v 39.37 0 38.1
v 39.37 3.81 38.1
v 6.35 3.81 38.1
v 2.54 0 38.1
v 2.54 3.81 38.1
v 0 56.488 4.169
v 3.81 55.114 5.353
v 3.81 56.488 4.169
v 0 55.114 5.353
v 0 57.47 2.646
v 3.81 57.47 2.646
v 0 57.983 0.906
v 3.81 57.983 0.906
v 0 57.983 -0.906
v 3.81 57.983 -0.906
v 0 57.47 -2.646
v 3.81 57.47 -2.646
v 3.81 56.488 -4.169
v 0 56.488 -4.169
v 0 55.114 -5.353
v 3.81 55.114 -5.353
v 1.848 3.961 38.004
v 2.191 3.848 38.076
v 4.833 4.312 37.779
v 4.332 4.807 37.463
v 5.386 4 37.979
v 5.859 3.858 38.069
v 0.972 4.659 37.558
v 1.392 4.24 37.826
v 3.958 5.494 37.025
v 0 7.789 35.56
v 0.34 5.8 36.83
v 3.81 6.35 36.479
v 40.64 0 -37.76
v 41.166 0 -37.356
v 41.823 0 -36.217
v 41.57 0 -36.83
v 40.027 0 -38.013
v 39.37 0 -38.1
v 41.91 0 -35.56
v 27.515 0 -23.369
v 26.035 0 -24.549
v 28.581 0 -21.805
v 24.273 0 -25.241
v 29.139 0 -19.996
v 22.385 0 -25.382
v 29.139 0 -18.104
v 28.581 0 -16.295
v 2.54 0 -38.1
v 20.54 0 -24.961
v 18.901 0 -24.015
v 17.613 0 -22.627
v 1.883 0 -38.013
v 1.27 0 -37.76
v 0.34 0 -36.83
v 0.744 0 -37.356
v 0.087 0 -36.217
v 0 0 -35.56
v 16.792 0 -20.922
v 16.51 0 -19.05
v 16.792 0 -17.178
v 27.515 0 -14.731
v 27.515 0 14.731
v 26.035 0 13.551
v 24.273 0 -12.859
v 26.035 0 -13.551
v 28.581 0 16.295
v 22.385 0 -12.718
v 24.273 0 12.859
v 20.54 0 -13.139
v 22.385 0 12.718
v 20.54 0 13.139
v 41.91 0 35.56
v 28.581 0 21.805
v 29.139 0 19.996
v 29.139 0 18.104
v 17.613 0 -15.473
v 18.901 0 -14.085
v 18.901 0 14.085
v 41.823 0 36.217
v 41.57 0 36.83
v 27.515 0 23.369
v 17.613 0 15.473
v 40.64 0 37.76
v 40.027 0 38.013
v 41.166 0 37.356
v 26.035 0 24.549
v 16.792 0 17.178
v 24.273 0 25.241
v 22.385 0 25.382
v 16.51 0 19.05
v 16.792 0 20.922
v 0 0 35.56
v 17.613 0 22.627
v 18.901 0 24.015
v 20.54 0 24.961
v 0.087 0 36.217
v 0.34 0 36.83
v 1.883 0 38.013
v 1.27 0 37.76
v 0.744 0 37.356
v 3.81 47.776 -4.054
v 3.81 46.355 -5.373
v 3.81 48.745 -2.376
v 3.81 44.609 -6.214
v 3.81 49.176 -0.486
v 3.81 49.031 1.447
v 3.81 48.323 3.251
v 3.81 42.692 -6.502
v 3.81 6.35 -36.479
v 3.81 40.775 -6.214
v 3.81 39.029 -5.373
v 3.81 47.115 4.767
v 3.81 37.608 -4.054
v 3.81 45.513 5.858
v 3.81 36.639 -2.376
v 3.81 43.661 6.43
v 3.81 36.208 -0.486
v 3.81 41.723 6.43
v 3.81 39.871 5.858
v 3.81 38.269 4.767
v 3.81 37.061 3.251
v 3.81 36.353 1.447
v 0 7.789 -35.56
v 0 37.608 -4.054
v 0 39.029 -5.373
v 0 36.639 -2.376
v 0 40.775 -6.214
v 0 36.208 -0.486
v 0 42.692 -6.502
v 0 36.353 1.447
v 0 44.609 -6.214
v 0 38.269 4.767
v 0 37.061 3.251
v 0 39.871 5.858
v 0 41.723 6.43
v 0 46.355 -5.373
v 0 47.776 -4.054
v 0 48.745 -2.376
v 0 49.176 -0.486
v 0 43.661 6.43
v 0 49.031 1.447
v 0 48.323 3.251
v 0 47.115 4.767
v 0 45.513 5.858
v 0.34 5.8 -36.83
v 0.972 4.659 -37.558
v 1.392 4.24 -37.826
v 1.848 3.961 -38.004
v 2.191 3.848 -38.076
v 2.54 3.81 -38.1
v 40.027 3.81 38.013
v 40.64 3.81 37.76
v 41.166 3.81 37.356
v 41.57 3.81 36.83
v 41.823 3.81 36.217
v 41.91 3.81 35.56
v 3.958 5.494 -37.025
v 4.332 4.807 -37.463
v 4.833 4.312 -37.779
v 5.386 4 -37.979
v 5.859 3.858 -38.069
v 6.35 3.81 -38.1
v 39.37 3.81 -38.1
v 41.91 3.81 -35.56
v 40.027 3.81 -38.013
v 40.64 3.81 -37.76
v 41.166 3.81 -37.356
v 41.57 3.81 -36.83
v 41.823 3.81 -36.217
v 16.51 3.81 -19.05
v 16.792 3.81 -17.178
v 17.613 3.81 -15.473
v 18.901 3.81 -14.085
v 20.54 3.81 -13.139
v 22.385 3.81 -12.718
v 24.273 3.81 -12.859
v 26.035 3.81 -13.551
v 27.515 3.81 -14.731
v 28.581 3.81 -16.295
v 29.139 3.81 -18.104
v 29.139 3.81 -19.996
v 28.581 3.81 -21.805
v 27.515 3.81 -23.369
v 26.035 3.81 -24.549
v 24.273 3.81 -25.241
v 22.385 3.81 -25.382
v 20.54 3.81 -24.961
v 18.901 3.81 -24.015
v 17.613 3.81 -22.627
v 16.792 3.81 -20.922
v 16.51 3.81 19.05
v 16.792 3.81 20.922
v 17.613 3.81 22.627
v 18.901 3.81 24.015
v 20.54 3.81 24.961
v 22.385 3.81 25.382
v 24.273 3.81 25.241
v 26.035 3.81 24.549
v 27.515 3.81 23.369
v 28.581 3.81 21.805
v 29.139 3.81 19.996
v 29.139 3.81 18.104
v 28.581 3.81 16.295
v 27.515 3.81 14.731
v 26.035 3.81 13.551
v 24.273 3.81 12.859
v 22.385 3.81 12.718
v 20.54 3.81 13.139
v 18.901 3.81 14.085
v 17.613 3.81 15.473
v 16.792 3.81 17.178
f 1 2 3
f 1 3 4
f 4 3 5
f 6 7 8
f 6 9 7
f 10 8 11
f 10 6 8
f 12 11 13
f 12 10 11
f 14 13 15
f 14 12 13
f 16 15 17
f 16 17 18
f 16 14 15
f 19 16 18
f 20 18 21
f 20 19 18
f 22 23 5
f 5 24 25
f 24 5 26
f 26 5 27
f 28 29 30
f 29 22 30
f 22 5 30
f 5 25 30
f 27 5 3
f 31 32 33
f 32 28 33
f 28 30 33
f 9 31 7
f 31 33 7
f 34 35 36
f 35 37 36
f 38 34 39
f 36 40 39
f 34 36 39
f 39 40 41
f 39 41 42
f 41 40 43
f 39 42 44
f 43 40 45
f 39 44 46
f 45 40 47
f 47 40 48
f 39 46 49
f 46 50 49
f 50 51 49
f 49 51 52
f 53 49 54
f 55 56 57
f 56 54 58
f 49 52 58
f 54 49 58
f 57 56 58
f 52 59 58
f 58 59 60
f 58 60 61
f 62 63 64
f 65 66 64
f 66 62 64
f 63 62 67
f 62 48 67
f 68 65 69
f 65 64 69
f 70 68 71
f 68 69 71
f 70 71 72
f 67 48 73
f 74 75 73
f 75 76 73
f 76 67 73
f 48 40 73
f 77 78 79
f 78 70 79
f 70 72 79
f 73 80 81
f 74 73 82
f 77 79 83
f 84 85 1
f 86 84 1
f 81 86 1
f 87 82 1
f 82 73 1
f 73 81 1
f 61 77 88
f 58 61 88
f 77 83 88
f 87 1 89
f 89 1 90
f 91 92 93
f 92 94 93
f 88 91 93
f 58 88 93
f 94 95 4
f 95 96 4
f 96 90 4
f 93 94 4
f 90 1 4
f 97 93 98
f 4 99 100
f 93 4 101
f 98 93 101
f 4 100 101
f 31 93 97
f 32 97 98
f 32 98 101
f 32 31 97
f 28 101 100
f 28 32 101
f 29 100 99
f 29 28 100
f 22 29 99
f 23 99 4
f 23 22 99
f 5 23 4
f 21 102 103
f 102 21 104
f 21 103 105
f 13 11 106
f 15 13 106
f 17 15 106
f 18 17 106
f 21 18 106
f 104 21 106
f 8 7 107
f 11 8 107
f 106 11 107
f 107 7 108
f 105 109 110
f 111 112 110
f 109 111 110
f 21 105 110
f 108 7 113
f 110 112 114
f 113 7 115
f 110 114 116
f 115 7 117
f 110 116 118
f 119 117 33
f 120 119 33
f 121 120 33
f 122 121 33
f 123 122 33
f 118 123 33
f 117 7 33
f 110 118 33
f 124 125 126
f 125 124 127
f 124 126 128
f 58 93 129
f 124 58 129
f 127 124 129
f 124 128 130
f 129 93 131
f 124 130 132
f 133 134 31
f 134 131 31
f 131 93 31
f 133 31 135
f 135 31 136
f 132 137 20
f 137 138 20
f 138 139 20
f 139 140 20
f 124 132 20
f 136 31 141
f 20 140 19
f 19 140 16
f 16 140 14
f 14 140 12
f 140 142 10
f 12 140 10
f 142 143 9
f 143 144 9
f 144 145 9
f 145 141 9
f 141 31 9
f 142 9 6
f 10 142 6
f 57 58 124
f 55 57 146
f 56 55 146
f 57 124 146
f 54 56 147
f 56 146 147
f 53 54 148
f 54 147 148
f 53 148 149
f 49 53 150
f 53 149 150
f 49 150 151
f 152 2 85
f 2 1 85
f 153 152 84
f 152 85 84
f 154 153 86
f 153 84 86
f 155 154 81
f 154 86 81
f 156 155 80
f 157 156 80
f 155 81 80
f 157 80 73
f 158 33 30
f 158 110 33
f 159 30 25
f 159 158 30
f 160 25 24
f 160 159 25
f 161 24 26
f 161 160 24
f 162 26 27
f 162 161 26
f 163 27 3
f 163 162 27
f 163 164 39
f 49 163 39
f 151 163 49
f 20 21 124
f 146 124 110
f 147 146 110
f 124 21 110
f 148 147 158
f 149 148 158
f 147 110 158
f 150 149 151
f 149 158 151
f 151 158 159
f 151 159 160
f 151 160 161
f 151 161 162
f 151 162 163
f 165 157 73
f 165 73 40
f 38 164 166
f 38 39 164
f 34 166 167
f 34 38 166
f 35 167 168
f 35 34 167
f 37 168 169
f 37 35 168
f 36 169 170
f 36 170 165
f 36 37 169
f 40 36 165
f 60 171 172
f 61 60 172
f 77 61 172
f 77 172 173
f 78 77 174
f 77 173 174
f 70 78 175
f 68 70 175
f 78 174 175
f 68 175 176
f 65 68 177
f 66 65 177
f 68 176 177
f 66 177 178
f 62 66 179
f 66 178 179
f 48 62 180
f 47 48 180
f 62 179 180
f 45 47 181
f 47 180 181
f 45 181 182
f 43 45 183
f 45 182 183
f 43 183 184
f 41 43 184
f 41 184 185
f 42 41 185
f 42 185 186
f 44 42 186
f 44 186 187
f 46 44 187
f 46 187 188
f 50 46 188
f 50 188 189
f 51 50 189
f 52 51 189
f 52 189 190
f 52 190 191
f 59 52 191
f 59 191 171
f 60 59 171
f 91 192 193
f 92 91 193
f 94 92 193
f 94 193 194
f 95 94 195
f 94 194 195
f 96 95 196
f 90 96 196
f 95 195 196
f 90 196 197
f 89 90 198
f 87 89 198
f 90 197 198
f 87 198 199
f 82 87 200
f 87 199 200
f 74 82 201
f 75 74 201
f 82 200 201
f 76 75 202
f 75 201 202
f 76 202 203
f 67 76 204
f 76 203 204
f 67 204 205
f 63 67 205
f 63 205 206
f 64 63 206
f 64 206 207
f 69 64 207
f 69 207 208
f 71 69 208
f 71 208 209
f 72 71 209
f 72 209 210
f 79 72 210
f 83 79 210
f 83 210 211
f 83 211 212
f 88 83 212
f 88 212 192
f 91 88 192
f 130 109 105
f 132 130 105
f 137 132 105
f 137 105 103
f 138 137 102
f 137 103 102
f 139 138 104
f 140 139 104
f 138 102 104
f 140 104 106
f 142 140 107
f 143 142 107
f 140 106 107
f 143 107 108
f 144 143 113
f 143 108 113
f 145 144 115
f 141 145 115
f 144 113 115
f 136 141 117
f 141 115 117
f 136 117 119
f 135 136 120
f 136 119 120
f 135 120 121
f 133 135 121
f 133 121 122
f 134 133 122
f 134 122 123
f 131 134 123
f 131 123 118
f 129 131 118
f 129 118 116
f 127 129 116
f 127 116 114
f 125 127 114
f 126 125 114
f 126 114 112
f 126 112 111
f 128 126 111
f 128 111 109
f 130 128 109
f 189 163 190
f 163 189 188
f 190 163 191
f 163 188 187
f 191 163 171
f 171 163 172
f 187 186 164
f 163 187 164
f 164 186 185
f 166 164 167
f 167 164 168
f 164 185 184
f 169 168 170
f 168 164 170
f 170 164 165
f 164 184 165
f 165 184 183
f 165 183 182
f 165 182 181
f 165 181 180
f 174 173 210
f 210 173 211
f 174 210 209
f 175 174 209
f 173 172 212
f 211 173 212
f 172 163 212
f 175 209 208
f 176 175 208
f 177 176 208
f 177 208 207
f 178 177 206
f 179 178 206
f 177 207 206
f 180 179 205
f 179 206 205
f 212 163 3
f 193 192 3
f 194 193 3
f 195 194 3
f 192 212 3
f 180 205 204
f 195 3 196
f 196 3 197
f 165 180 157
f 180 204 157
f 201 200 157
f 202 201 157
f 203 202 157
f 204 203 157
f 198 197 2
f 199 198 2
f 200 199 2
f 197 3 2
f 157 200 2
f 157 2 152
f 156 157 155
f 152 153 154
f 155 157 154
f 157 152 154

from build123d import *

# Parameters (mm, degrees)
BOSS_EXTRUDE1_DEPTH = 38.1
CUT_EXTRUDE2_DEPTH  = 76.2
FILLET1_R           = 6.35
SKETCH10_W          = 21.59
SKETCH10_H          = 76.2
CUT_EXTRUDE3_DEPTH  = 76.2
FILLET2_R           = 2.54
FILLET3_R           = 2.54
SKETCH11_R          = 6.5024
CUT_EXTRUDE4_DEPTH  = 76.2
SKETCH12_R          = 6.35
CUT_EXTRUDE5_DEPTH  = 76.2


with BuildPart() as part:
    # Sketch7 → Boss-Extrude1 (new, symmetric)
    with BuildSketch(Plane.XY):
        Polygon((0, 0), (0, 63.5), (3.81, 63.5), (3.81, 3.81), (63.5, 3.81), (63.5, 0), align=None)
    extrude(amount=BOSS_EXTRUDE1_DEPTH, both=True)

    # Sketch8 → Cut-Extrude2 (cut)
    with BuildSketch(Plane(origin=(3.81, 0, 0), x_dir=(0, 0, -1), z_dir=(1, 0, 0))):
        Polygon((-38.1, 63.5), (-38.1, 3.81), (0, 63.5), align=None)
        Polygon((38.1, 63.5), (0, 63.5), (38.1, 3.81), align=None)
    extrude(amount=-CUT_EXTRUDE2_DEPTH, mode=Mode.SUBTRACT)

    # Fillet1
    fillet1_edges = [part.edges().sort_by_distance(p)[0] for p in [
        (1.905, 63.5, 0),
    ]]
    fillet(fillet1_edges, radius=FILLET1_R)

    # Sketch10 → Cut-Extrude3 (cut)
    with BuildSketch(Plane(origin=(0, 3.81, 0), x_dir=(1, 0, 0), z_dir=(0, 1, 0))):
        with Locations((52.705, 0)):
            Rectangle(SKETCH10_W, SKETCH10_H)
    extrude(amount=-CUT_EXTRUDE3_DEPTH, mode=Mode.SUBTRACT)

    # Fillet2
    fillet2_edges = [part.edges().sort_by_distance(p)[0] for p in [
        (0, 1.905, 38.1),
        (0, 1.905, -38.1),
        (41.91, 1.905, -38.1),
        (41.91, 1.905, 38.1),
    ]]
    fillet(fillet2_edges, radius=FILLET2_R)

    # Fillet3
    fillet3_edges = [part.edges().sort_by_distance(p)[0] for p in [
        (3.81, 3.81, 0),
    ]]
    fillet(fillet3_edges, radius=FILLET3_R)

    # Sketch11 → Cut-Extrude4 (cut)
    with BuildSketch(Plane(origin=(3.81, 0, 0), x_dir=(0, 0, -1), z_dir=(1, 0, 0))):
        with Locations((0, 42.692021475)):
            Circle(SKETCH11_R)
    extrude(amount=-CUT_EXTRUDE4_DEPTH, mode=Mode.SUBTRACT)

    # Sketch12 → Cut-Extrude5 (cut)
    with BuildSketch(Plane(origin=(0, 3.81, 0), x_dir=(1, 0, 0), z_dir=(0, 1, 0))):
        with Locations(Location((22.86, 19.05, 0), (0, 0, 180))):
            Circle(SKETCH12_R)
        with Locations(Location((22.86, -19.05, 0), (0, 0, 180))):
            Circle(SKETCH12_R)
    extrude(amount=-CUT_EXTRUDE5_DEPTH, mode=Mode.SUBTRACT)


solid = part.part
